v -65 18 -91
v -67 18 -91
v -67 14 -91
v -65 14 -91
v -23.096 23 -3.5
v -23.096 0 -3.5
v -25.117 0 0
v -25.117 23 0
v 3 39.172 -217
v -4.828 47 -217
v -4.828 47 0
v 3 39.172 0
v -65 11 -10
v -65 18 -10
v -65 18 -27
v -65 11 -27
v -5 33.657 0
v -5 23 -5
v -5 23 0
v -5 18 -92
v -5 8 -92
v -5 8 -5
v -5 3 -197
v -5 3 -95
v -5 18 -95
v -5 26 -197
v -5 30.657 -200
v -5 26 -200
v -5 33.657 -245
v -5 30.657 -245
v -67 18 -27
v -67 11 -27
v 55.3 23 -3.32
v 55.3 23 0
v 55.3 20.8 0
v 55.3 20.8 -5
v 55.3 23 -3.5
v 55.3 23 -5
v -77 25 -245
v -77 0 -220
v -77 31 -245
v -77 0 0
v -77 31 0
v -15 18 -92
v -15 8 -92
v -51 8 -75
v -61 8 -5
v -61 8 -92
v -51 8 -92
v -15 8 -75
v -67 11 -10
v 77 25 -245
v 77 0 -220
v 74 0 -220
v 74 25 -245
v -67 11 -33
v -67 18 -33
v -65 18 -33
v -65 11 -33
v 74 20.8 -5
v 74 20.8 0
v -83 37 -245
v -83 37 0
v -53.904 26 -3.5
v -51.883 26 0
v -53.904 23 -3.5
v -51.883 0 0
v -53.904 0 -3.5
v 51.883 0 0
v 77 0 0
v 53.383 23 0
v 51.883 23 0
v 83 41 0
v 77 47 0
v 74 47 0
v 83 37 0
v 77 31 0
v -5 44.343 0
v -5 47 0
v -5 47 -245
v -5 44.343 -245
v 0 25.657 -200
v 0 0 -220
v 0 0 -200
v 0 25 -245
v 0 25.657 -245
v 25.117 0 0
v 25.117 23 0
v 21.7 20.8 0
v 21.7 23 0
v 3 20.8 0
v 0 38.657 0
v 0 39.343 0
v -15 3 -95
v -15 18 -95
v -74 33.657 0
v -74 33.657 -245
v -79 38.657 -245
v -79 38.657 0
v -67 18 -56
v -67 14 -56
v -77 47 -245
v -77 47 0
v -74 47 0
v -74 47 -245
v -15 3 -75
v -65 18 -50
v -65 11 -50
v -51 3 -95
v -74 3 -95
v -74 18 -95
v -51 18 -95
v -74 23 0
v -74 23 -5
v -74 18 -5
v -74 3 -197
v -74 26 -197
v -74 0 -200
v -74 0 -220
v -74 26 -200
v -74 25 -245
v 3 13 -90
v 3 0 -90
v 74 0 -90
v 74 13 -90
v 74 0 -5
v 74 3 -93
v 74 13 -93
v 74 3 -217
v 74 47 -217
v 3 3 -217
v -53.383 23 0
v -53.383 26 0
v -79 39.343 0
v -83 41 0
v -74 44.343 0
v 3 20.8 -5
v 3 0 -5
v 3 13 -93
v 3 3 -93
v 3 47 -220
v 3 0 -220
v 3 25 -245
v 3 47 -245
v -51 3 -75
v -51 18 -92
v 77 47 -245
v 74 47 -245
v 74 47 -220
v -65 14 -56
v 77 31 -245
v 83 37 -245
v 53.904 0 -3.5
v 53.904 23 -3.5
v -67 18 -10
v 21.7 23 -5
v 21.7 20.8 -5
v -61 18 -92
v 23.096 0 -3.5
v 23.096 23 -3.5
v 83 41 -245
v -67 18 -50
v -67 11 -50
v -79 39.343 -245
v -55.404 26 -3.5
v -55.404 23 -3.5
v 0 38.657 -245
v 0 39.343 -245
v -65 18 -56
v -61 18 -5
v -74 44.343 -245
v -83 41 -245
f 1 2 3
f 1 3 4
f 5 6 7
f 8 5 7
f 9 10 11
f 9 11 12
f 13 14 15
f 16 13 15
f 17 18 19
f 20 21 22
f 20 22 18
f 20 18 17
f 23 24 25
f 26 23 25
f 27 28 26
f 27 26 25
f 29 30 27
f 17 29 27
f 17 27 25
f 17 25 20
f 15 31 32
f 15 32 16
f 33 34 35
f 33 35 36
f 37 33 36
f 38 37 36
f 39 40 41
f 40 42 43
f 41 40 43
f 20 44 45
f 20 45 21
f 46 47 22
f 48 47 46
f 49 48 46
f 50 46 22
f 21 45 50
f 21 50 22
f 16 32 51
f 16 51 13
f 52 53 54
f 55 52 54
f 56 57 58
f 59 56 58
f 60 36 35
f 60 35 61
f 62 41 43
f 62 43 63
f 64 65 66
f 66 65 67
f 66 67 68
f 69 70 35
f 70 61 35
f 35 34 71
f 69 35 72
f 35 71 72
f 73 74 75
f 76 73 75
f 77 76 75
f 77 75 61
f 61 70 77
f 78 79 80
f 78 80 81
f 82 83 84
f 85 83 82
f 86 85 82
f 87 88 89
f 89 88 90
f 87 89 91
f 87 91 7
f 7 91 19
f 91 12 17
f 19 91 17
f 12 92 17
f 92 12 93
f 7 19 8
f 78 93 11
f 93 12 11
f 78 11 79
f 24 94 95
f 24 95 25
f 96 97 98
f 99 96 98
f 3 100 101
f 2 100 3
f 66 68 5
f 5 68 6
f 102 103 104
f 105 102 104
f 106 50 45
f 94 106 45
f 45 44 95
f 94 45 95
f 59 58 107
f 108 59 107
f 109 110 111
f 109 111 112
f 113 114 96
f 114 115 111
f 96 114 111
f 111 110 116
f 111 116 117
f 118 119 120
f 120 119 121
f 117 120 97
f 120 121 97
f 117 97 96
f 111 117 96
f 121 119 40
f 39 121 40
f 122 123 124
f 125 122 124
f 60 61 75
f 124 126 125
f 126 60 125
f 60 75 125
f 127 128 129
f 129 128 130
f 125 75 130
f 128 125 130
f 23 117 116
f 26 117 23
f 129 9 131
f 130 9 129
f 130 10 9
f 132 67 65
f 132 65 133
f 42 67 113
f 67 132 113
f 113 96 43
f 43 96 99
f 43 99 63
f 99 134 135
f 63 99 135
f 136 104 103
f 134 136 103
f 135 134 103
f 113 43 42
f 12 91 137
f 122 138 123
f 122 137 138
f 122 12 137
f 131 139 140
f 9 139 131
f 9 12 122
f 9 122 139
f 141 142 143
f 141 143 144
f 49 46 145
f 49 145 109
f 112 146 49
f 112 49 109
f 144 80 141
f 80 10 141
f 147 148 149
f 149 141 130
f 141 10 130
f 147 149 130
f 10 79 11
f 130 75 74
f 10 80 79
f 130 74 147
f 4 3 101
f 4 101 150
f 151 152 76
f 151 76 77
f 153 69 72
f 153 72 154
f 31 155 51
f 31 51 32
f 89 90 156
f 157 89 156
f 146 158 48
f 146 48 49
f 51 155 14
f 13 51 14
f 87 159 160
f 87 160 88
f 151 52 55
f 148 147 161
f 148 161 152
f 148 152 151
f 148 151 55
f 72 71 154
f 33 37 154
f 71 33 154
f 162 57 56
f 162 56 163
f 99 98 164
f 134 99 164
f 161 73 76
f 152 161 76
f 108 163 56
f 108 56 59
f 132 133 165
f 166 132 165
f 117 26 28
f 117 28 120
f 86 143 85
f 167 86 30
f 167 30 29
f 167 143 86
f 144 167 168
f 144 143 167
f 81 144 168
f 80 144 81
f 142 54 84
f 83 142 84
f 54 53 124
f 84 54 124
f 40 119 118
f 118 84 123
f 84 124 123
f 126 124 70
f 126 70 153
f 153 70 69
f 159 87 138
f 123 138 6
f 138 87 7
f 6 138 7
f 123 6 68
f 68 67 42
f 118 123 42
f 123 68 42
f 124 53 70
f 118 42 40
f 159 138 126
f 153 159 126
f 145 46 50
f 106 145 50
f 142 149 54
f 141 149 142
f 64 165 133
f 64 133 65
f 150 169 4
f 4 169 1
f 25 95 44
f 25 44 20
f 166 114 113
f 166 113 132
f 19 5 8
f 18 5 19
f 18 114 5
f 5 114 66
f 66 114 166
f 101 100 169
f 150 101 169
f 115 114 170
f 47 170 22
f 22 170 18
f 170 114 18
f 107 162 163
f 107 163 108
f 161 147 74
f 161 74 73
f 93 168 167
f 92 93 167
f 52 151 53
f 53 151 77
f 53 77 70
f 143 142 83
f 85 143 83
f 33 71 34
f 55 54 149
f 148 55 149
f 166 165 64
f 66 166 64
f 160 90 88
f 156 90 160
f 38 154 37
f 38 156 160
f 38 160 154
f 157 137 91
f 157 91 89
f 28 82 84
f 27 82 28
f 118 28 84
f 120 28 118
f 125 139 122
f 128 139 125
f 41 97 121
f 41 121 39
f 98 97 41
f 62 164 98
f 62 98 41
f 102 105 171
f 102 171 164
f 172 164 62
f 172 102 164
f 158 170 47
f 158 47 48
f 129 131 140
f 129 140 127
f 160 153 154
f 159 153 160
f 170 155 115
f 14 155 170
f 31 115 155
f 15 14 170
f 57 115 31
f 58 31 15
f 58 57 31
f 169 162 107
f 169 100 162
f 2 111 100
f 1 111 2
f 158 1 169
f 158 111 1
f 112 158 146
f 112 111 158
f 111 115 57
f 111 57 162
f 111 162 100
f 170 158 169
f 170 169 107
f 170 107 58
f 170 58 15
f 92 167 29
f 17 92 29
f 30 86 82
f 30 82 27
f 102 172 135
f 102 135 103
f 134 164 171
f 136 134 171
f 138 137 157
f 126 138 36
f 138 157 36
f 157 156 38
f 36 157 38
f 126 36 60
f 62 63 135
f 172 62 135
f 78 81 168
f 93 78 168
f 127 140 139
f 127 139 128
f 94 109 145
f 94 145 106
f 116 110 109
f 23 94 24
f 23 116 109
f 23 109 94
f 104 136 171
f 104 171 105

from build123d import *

# Parameters (mm, degrees)
EXTRUDE_1_DEPTH       = 200
SKETCH_2_W            = 148
SKETCH_2_H            = 194
CUT_EXTRUDE_1_DEPTH   = 44
SKETCH_3_W            = 8
SKETCH_3_H            = 194
EXTRUDE_1_2_DEPTH     = 44
CUT_EXTRUDE_2_DEPTH   = 222.580685079
CUT_EXTRUDE_3_DEPTH   = 219.876677606
MOVE_FACE_1_BY        = 2
MOVE_FACE_1_2_BY      = 2
CUT_EXTRUDE_4_DEPTH   = 222.580685079
CUT_EXTRUDE_5_DEPTH   = 16.171573
MOVE_FACE_2_BY        = 45
MOVE_START            = -217
MOVE_FACE_4_DEPTH     = 20
SKETCH_10_W           = 71
SKETCH_10_H           = 47
CUT_EXTRUDE_6_DEPTH   = 25
SKETCH_11_W           = 69
SKETCH_11_H           = 26
CUT_EXTRUDE_7_DEPTH   = 45
CUT_EXTRUDE_8_DEPTH   = 45
CHAMFER_1_SIZE        = 25
CUT_EXTRUDE_9_REACH   = 264.393
SKETCH_13_W           = 71
SKETCH_13_H           = 85
SKETCH_14_W           = 71
SKETCH_14_H           = 3
EXTRUDE_2_DEPTH       = 10
CUT_EXTRUDE_10_DEPTH  = 16.171572875
SKETCH_16_W           = 18.7
SKETCH_16_H           = 5
CUT_EXTRUDE_11_DEPTH  = 4.2
SKETCH_17_W           = 69
SKETCH_17_H           = 90
EXTRUDE_3_DEPTH       = 15
SKETCH_18_W           = 56
SKETCH_18_H           = 87
CUT_EXTRUDE_12_DEPTH  = 10
CUT_EXTRUDE_13_REACH  = 262.298
SKETCH_19_W           = 36
SKETCH_19_H           = 34
SKETCH_21_W           = 2
SKETCH_21_H           = 17
SKETCH_21_H_2         = 35
CUT_EXTRUDE_1_2_DEPTH = 7
MOVE_FACE_5_BY        = 3


# Read off the part's stored shape, not the designer's step: 移动面4
with BuildPart() as part:
    # 草图1 → Extrude 1 (new body)
    with BuildSketch(Plane.XY):
        Polygon((77, 0), (-77, 0), (-77, 31), (-83, 37), (-83, 41), (-77, 47), (77, 47), (83, 41), (83, 37), (77, 31), align=None)
    extrude(amount=-EXTRUDE_1_DEPTH)

    # 草图2 → Cut-Extrude 1 (cut)
    with BuildSketch(Plane(origin=(0, 47, 0), x_dir=(1, 0, 0), z_dir=(0, 1, 0))):
        with Locations((0, 100)):
            Rectangle(SKETCH_2_W, SKETCH_2_H)
    extrude(amount=-CUT_EXTRUDE_1_DEPTH, mode=Mode.SUBTRACT)

    # 草图3 → Extrude 1 2 (add)
    with BuildSketch(Plane(origin=(0, 3, 0), x_dir=(1, 0, 0), z_dir=(0, 1, 0))):
        with Locations((-1, 100)):
            Rectangle(SKETCH_3_W, SKETCH_3_H)
    extrude(amount=EXTRUDE_1_2_DEPTH)

    # 草图6 → 切除-拉伸2 (cut, through all)
    with BuildSketch(Plane.XY):
        Polygon((-74, 47), (-74, 44.343145751), (-79, 39.343145751), (-79, 38.656854249), (-74, 33.656854249), (-74, 26), (-5, 26), (-5, 33.656854249), (0, 38.656854249), (0, 39.343145751), (-5, 44.343145751), (-5, 47), align=None)
    extrude(amount=-CUT_EXTRUDE_2_DEPTH, mode=Mode.SUBTRACT)

    # 草图7 → 切除-拉伸3 (cut, through all)
    with BuildSketch(Plane.XY.offset(-197)):
        Polygon((-4.828427125, 47), (3, 39.171572875), (74, 39.171572875), (74, 47), (3, 47), align=None)
    extrude(amount=CUT_EXTRUDE_3_DEPTH, mode=Mode.SUBTRACT)

    # Move Face 1: a face moved outward by 2.0
    extrude(part.faces().sort_by_distance((-39.5, 14.5, -3))[0], amount=MOVE_FACE_1_BY, dir=(0, 0, -1))

    # Move Face 1 2: a face moved outward by 2.0
    extrude(part.faces().sort_by_distance((38.5, 21.085786438, -3))[0], amount=MOVE_FACE_1_2_BY, dir=(0, 0, -1))

    # 草图8 → 切除-拉伸4 (cut, through all)
    with BuildSketch(Plane.XZ):
        Polygon((-51.883419246, 0), (-53.904145188, -3.5), (-23.095854812, -3.5), (-25.116580754, 0), align=None)
        Polygon((25.116580754, 0), (51.883419246, 0), (53.904145188, -3.5), (23.095854812, -3.5), align=None)
    extrude(amount=-CUT_EXTRUDE_4_DEPTH, mode=Mode.SUBTRACT)

    # 草图9 → 切除-拉伸5 (cut)
    with BuildSketch(Plane(origin=(0, 39.171572875, 0), x_dir=(1, 0, 0), z_dir=(0, 1, 0))):
        Polygon((26.616580754, 0), (24.595854812, 3.5), (55.404145188, 3.5), (53.383419246, 0), (74, 0), (74, 5), (3, 5), (3, 0), align=None)
        Polygon((-55.404145188, 3.5), (-24.595854812, 3.5), (-26.616580754, 0), (-5, 0), (-5, 5), (-74, 5), (-74, 0), (-53.383419246, 0), align=None)
    extrude(amount=-CUT_EXTRUDE_5_DEPTH, mode=Mode.SUBTRACT)

    # Move Face 2: a face moved outward by 45.0
    extrude(part.faces().sort_by_distance((10.164079255, 20.448401084, -200))[0], amount=MOVE_FACE_2_BY, dir=(0, 0, -1))

    # Move Face 4 outline → Move Face 4 (cut)
    with BuildSketch(Plane.XY.offset(MOVE_START)):
        Polygon((74, 3), (74, 47), (-4.828427125, 47), (3, 39.171572875), (3, 3), align=None)
    extrude(amount=MOVE_FACE_4_DEPTH, mode=Mode.SUBTRACT)

    # 草图10 → 切除-拉伸6 (cut)
    with BuildSketch(Plane(origin=(0, 0, -245), x_dir=(-1, 0, 0), z_dir=(0, 0, -1))):
        with Locations((-38.5, 23.5)):
            Rectangle(SKETCH_10_W, SKETCH_10_H)
    extrude(amount=-CUT_EXTRUDE_6_DEPTH, mode=Mode.SUBTRACT)

    # 草图11 → 切除-拉伸7 (cut)
    with BuildSketch(Plane(origin=(0, 0, -245), x_dir=(-1, 0, 0), z_dir=(0, 0, -1))):
        with Locations((39.5, 13)):
            Rectangle(SKETCH_11_W, SKETCH_11_H)
    extrude(amount=-CUT_EXTRUDE_7_DEPTH, mode=Mode.SUBTRACT)

    # 草图12 → 切除-拉伸8 (cut)
    with BuildSketch(Plane(origin=(0, 0, -245), x_dir=(-1, 0, 0), z_dir=(0, 0, -1))):
        Polygon((5, 0), (0, 0), (0, 25.656854249), (5, 30.656854249), align=None)
    extrude(amount=-CUT_EXTRUDE_8_DEPTH, mode=Mode.SUBTRACT)

    # 倒角1
    chamfer_1_edges = [part.edges().sort_by_distance(p)[0] for p in [
        (-75.5, 0, -245),
        (1.5, 0, -245),
        (75.5, 0, -245),
    ]]
    chamfer(chamfer_1_edges, length=CHAMFER_1_SIZE)

    # 草图13 → 切除-拉伸9 (cut, up to next)
    with BuildSketch(Plane(origin=(0, 3, 0), x_dir=(1, 0, 0), z_dir=(0, 1, 0)), mode=Mode.PRIVATE) as cut_extrude_9_sk1:
        with Locations((38.5, 47.5)):
            Rectangle(SKETCH_13_W, SKETCH_13_H)
    cut_extrude_9_tool1 = extrude(cut_extrude_9_sk1.sketch, amount=-CUT_EXTRUDE_9_REACH, mode=Mode.PRIVATE) & part.part
    add(cut_extrude_9_tool1.solids().sort_by_distance((38.5, 3, -47.5))[0], mode=Mode.SUBTRACT)

    # 草图14 → 凸台-拉伸2 (add)
    with BuildSketch(Plane(origin=(0, 3, 0), x_dir=(1, 0, 0), z_dir=(0, 1, 0))):
        with Locations((38.5, 91.5)):
            Rectangle(SKETCH_14_W, SKETCH_14_H)
    extrude(amount=EXTRUDE_2_DEPTH)

    # 草图15 → 切除-拉伸10 (cut)
    with BuildSketch(Plane(origin=(0, 39.171572875, 0), x_dir=(1, 0, 0), z_dir=(0, 1, 0))):
        Polygon((51.883419246, 0), (53.904145188, 3.5), (55.404145188, 3.5), (53.383419246, 0), align=None)
    extrude(amount=-CUT_EXTRUDE_10_DEPTH, mode=Mode.SUBTRACT)

    # 草图16 → 切除-拉伸11 (cut)
    with BuildSketch(Plane(origin=(0, 25, 0), x_dir=(1, 0, 0), z_dir=(0, 1, 0))):
        with Locations((12.35, 2.5)):
            Rectangle(SKETCH_16_W, SKETCH_16_H)
        with Locations((64.65, 2.5)):
            Rectangle(SKETCH_16_W, SKETCH_16_H)
    extrude(amount=-CUT_EXTRUDE_11_DEPTH, mode=Mode.SUBTRACT)

    # 草图17 → 凸台-拉伸3 (add)
    with BuildSketch(Plane(origin=(0, 3, 0), x_dir=(1, 0, 0), z_dir=(0, 1, 0))):
        with Locations((-39.5, 50)):
            Rectangle(SKETCH_17_W, SKETCH_17_H)
    extrude(amount=EXTRUDE_3_DEPTH)

    # 草图18 → 切除-拉伸12 (cut)
    with BuildSketch(Plane(origin=(0, 18, 0), x_dir=(1, 0, 0), z_dir=(0, 1, 0))):
        with Locations((-33, 48.5)):
            Rectangle(SKETCH_18_W, SKETCH_18_H)
    extrude(amount=-CUT_EXTRUDE_12_DEPTH, mode=Mode.SUBTRACT)

    # 切除-拉伸13: up to this face of the body (flat: up to its plane)
    cut_extrude_13_end = Plane(part.part.faces().sort_by_distance((-39.5, 3, -146))[0])
    # 草图19 → 切除-拉伸13 (cut, up to the picked face)
    with BuildSketch(Plane(origin=(0, 18, 0), x_dir=(1, 0, 0), z_dir=(0, 1, 0)), mode=Mode.PRIVATE) as cut_extrude_13_sk1:
        with Locations((-33, 92)):
            Rectangle(SKETCH_19_W, SKETCH_19_H)
    cut_extrude_13_tool1 = split(extrude(cut_extrude_13_sk1.sketch, amount=-CUT_EXTRUDE_13_REACH, mode=Mode.PRIVATE), bisect_by=cut_extrude_13_end, keep=Keep.BOTH, mode=Mode.PRIVATE)
    add(cut_extrude_13_tool1.solids().sort_by(Axis((-33, 18, -92), (0, -1, 0)))[0], mode=Mode.SUBTRACT)

    # 草图21 → Cut-Extrude 1 2 (cut)
    with BuildSketch(Plane(origin=(0, 18, 0), x_dir=(1, 0, 0), z_dir=(0, 1, 0))):
        with Locations((-66, 18.5)):
            Rectangle(SKETCH_21_W, SKETCH_21_H)
        with Locations((-66, 41.5)):
            Rectangle(SKETCH_21_W, SKETCH_21_H)
        with Locations((-66, 73.5)):
            Rectangle(SKETCH_21_W, SKETCH_21_H_2)
    extrude(amount=-CUT_EXTRUDE_1_2_DEPTH, mode=Mode.SUBTRACT)

    # Move Face 5: a face moved outward by 3.0
    extrude(part.faces().sort_by_distance((-66, 11, -73.5))[0], amount=MOVE_FACE_5_BY, dir=(0, 1, 0))


solid = part.part
